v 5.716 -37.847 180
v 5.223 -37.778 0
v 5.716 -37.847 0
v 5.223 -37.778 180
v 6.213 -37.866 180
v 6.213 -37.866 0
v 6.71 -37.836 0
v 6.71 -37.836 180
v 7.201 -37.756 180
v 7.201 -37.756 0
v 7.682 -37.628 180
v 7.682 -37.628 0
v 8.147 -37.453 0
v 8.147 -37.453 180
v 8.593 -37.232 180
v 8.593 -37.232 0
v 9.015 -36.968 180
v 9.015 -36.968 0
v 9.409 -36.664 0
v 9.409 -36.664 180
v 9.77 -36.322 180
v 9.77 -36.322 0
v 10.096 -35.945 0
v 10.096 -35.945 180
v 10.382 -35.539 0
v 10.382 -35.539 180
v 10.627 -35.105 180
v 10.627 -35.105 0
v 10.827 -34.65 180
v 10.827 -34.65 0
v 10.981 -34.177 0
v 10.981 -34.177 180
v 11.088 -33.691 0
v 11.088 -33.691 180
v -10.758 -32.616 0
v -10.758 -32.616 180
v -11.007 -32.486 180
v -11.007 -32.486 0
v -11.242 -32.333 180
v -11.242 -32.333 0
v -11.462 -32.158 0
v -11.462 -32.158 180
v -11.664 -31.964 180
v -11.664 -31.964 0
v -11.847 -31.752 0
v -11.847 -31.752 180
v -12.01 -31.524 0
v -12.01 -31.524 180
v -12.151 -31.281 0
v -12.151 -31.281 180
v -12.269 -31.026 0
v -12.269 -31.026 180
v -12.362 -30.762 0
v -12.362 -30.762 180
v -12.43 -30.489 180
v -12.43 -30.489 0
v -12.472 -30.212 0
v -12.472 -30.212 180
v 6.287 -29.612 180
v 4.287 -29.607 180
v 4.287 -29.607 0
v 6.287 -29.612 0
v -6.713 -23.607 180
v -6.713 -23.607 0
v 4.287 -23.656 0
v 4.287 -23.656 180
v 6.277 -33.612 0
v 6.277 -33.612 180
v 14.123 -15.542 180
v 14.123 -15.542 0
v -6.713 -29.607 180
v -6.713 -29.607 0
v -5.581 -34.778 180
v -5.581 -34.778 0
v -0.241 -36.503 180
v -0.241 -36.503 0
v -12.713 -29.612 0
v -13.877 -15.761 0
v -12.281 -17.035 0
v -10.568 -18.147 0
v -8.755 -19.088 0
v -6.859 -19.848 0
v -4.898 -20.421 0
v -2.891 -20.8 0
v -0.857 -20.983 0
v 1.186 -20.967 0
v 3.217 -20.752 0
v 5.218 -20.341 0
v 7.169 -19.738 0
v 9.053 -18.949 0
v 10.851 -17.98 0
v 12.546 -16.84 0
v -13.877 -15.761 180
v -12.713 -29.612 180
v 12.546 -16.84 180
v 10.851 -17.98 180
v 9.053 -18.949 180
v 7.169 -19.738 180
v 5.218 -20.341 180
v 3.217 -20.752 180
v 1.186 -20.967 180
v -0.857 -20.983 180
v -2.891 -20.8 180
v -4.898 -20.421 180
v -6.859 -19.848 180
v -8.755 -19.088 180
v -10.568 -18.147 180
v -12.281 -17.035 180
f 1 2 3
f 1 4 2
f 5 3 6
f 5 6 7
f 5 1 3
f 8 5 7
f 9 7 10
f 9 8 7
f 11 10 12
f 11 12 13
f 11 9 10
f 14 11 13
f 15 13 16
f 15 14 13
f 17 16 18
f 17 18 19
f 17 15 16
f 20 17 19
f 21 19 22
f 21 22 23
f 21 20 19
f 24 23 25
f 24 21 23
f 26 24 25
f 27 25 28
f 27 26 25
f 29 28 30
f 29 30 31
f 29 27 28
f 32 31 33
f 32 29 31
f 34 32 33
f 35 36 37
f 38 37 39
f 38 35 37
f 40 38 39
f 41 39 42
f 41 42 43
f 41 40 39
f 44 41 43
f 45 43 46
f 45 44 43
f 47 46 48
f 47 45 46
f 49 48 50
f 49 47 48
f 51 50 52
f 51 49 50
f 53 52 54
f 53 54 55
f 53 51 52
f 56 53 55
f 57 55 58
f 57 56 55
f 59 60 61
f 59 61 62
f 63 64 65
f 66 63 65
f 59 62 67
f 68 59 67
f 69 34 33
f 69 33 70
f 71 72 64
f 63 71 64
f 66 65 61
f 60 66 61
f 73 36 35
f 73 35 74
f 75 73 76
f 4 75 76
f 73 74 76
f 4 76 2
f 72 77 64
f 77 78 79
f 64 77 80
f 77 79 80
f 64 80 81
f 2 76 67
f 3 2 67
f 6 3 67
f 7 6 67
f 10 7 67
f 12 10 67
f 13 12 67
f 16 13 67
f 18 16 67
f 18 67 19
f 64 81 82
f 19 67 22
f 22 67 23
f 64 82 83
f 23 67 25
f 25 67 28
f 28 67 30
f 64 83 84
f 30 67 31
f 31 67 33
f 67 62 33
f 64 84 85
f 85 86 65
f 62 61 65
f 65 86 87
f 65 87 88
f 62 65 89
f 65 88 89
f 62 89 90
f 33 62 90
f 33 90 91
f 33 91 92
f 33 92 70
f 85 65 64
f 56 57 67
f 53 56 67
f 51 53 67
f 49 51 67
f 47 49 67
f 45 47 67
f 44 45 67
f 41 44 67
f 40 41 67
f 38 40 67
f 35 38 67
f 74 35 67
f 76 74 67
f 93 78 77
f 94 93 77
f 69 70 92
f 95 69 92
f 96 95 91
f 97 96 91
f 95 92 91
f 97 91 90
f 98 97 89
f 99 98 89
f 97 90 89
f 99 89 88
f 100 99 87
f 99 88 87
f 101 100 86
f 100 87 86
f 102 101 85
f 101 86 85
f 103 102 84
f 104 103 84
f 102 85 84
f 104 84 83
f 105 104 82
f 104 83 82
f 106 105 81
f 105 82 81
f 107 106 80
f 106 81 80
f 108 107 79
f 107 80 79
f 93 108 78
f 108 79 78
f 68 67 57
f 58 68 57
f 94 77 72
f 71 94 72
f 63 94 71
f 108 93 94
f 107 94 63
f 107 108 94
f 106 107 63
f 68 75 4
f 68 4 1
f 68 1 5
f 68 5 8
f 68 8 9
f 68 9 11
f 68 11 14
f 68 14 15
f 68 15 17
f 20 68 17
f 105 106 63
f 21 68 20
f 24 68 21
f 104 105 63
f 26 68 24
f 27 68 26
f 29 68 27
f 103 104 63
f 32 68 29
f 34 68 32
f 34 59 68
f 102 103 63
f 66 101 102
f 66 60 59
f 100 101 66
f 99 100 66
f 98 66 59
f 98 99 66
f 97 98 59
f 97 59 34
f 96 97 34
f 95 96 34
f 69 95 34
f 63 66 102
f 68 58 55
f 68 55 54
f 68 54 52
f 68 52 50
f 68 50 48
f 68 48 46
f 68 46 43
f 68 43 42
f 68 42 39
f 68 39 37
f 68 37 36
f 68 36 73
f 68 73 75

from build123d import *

# Parameters (mm, degrees)
F1_DEPTH    = 180
F2_R        = 5
F3_T1_DEPTH = 189.5214724234


# Not quite as in the source:
# - a fillet or chamfer that OpenCascade refuses, or shapes differently, is made with other operations: its cross-section is extruded or revolved along the edge and cut away or added


with BuildPart() as f1:
    # F0 (on Top) → F1 (new body)
    with BuildSketch(Plane.XY):
        with BuildLine():
            ThreePointArc((14.1226732436, -15.5418821401), (0.1645874713, -20.9993550131), (-13.8773267564, -15.7613388421))
            Line((-13.8773267564, -15.7613388421), (-12.7134246975, -29.6120676683))
            Line((-12.7134246975, -29.6120676683), (-6.7134246975, -29.6071426253))
            Line((-6.7134246975, -29.6071426253), (-6.7134246975, -23.6071426253))
            Line((-6.7134246975, -23.6071426253), (4.2865298223, -23.6563930556))
            Line((4.2865298223, -23.6563930556), (4.2865298223, -29.6071426253))
            Line((4.2865298223, -29.6071426253), (6.2865237583, -29.6120676683))
            Line((6.2865237583, -29.6120676683), (6.2766736722, -33.6120555403))
            Line((6.2766736722, -33.6120555403), (-12.4721404439, -30.2120676683))
            Line((-12.4721404439, -30.2120676683), (-12.4721404439, -31.7862083661))
            ThreePointArc((-12.4721404439, -31.7862083661), (-1.3967093827, -36.1708063262), (10.2766736722, -38.5418821401))
            Line((10.2766736722, -38.5418821401), (14.1226732436, -15.5418821401))
        make_face()
    extrude(amount=F1_DEPTH)

    # F2
    f2_edges = [f1.edges().sort_by_distance(p)[0] for p in [
        (10.276674, -38.541882, 90),
    ]]
    fillet(f2_edges, radius=F2_R)

    # F3: fillet of radius 3 on 1 edges, made by hand

    # F3_s2 → F3_t1 (cut)
    with BuildSketch(Plane.XY.offset(-4.7607362117)):
        with BuildLine():
            ThreePointArc((-10.7583691092, -32.6164645294), (-11.9315343306, -31.6396992801), (-12.4721404439, -30.2120676683))
            Line((-12.4721404439, -30.2120676683), (-12.4721404439, -31.7862083661))
            ThreePointArc((-12.4721404439, -31.7862083661), (-11.618180513, -32.2073755998), (-10.7583691092, -32.6164645294))
        make_face()
    extrude(amount=F3_T1_DEPTH, mode=Mode.SUBTRACT)


solid = f1.part
